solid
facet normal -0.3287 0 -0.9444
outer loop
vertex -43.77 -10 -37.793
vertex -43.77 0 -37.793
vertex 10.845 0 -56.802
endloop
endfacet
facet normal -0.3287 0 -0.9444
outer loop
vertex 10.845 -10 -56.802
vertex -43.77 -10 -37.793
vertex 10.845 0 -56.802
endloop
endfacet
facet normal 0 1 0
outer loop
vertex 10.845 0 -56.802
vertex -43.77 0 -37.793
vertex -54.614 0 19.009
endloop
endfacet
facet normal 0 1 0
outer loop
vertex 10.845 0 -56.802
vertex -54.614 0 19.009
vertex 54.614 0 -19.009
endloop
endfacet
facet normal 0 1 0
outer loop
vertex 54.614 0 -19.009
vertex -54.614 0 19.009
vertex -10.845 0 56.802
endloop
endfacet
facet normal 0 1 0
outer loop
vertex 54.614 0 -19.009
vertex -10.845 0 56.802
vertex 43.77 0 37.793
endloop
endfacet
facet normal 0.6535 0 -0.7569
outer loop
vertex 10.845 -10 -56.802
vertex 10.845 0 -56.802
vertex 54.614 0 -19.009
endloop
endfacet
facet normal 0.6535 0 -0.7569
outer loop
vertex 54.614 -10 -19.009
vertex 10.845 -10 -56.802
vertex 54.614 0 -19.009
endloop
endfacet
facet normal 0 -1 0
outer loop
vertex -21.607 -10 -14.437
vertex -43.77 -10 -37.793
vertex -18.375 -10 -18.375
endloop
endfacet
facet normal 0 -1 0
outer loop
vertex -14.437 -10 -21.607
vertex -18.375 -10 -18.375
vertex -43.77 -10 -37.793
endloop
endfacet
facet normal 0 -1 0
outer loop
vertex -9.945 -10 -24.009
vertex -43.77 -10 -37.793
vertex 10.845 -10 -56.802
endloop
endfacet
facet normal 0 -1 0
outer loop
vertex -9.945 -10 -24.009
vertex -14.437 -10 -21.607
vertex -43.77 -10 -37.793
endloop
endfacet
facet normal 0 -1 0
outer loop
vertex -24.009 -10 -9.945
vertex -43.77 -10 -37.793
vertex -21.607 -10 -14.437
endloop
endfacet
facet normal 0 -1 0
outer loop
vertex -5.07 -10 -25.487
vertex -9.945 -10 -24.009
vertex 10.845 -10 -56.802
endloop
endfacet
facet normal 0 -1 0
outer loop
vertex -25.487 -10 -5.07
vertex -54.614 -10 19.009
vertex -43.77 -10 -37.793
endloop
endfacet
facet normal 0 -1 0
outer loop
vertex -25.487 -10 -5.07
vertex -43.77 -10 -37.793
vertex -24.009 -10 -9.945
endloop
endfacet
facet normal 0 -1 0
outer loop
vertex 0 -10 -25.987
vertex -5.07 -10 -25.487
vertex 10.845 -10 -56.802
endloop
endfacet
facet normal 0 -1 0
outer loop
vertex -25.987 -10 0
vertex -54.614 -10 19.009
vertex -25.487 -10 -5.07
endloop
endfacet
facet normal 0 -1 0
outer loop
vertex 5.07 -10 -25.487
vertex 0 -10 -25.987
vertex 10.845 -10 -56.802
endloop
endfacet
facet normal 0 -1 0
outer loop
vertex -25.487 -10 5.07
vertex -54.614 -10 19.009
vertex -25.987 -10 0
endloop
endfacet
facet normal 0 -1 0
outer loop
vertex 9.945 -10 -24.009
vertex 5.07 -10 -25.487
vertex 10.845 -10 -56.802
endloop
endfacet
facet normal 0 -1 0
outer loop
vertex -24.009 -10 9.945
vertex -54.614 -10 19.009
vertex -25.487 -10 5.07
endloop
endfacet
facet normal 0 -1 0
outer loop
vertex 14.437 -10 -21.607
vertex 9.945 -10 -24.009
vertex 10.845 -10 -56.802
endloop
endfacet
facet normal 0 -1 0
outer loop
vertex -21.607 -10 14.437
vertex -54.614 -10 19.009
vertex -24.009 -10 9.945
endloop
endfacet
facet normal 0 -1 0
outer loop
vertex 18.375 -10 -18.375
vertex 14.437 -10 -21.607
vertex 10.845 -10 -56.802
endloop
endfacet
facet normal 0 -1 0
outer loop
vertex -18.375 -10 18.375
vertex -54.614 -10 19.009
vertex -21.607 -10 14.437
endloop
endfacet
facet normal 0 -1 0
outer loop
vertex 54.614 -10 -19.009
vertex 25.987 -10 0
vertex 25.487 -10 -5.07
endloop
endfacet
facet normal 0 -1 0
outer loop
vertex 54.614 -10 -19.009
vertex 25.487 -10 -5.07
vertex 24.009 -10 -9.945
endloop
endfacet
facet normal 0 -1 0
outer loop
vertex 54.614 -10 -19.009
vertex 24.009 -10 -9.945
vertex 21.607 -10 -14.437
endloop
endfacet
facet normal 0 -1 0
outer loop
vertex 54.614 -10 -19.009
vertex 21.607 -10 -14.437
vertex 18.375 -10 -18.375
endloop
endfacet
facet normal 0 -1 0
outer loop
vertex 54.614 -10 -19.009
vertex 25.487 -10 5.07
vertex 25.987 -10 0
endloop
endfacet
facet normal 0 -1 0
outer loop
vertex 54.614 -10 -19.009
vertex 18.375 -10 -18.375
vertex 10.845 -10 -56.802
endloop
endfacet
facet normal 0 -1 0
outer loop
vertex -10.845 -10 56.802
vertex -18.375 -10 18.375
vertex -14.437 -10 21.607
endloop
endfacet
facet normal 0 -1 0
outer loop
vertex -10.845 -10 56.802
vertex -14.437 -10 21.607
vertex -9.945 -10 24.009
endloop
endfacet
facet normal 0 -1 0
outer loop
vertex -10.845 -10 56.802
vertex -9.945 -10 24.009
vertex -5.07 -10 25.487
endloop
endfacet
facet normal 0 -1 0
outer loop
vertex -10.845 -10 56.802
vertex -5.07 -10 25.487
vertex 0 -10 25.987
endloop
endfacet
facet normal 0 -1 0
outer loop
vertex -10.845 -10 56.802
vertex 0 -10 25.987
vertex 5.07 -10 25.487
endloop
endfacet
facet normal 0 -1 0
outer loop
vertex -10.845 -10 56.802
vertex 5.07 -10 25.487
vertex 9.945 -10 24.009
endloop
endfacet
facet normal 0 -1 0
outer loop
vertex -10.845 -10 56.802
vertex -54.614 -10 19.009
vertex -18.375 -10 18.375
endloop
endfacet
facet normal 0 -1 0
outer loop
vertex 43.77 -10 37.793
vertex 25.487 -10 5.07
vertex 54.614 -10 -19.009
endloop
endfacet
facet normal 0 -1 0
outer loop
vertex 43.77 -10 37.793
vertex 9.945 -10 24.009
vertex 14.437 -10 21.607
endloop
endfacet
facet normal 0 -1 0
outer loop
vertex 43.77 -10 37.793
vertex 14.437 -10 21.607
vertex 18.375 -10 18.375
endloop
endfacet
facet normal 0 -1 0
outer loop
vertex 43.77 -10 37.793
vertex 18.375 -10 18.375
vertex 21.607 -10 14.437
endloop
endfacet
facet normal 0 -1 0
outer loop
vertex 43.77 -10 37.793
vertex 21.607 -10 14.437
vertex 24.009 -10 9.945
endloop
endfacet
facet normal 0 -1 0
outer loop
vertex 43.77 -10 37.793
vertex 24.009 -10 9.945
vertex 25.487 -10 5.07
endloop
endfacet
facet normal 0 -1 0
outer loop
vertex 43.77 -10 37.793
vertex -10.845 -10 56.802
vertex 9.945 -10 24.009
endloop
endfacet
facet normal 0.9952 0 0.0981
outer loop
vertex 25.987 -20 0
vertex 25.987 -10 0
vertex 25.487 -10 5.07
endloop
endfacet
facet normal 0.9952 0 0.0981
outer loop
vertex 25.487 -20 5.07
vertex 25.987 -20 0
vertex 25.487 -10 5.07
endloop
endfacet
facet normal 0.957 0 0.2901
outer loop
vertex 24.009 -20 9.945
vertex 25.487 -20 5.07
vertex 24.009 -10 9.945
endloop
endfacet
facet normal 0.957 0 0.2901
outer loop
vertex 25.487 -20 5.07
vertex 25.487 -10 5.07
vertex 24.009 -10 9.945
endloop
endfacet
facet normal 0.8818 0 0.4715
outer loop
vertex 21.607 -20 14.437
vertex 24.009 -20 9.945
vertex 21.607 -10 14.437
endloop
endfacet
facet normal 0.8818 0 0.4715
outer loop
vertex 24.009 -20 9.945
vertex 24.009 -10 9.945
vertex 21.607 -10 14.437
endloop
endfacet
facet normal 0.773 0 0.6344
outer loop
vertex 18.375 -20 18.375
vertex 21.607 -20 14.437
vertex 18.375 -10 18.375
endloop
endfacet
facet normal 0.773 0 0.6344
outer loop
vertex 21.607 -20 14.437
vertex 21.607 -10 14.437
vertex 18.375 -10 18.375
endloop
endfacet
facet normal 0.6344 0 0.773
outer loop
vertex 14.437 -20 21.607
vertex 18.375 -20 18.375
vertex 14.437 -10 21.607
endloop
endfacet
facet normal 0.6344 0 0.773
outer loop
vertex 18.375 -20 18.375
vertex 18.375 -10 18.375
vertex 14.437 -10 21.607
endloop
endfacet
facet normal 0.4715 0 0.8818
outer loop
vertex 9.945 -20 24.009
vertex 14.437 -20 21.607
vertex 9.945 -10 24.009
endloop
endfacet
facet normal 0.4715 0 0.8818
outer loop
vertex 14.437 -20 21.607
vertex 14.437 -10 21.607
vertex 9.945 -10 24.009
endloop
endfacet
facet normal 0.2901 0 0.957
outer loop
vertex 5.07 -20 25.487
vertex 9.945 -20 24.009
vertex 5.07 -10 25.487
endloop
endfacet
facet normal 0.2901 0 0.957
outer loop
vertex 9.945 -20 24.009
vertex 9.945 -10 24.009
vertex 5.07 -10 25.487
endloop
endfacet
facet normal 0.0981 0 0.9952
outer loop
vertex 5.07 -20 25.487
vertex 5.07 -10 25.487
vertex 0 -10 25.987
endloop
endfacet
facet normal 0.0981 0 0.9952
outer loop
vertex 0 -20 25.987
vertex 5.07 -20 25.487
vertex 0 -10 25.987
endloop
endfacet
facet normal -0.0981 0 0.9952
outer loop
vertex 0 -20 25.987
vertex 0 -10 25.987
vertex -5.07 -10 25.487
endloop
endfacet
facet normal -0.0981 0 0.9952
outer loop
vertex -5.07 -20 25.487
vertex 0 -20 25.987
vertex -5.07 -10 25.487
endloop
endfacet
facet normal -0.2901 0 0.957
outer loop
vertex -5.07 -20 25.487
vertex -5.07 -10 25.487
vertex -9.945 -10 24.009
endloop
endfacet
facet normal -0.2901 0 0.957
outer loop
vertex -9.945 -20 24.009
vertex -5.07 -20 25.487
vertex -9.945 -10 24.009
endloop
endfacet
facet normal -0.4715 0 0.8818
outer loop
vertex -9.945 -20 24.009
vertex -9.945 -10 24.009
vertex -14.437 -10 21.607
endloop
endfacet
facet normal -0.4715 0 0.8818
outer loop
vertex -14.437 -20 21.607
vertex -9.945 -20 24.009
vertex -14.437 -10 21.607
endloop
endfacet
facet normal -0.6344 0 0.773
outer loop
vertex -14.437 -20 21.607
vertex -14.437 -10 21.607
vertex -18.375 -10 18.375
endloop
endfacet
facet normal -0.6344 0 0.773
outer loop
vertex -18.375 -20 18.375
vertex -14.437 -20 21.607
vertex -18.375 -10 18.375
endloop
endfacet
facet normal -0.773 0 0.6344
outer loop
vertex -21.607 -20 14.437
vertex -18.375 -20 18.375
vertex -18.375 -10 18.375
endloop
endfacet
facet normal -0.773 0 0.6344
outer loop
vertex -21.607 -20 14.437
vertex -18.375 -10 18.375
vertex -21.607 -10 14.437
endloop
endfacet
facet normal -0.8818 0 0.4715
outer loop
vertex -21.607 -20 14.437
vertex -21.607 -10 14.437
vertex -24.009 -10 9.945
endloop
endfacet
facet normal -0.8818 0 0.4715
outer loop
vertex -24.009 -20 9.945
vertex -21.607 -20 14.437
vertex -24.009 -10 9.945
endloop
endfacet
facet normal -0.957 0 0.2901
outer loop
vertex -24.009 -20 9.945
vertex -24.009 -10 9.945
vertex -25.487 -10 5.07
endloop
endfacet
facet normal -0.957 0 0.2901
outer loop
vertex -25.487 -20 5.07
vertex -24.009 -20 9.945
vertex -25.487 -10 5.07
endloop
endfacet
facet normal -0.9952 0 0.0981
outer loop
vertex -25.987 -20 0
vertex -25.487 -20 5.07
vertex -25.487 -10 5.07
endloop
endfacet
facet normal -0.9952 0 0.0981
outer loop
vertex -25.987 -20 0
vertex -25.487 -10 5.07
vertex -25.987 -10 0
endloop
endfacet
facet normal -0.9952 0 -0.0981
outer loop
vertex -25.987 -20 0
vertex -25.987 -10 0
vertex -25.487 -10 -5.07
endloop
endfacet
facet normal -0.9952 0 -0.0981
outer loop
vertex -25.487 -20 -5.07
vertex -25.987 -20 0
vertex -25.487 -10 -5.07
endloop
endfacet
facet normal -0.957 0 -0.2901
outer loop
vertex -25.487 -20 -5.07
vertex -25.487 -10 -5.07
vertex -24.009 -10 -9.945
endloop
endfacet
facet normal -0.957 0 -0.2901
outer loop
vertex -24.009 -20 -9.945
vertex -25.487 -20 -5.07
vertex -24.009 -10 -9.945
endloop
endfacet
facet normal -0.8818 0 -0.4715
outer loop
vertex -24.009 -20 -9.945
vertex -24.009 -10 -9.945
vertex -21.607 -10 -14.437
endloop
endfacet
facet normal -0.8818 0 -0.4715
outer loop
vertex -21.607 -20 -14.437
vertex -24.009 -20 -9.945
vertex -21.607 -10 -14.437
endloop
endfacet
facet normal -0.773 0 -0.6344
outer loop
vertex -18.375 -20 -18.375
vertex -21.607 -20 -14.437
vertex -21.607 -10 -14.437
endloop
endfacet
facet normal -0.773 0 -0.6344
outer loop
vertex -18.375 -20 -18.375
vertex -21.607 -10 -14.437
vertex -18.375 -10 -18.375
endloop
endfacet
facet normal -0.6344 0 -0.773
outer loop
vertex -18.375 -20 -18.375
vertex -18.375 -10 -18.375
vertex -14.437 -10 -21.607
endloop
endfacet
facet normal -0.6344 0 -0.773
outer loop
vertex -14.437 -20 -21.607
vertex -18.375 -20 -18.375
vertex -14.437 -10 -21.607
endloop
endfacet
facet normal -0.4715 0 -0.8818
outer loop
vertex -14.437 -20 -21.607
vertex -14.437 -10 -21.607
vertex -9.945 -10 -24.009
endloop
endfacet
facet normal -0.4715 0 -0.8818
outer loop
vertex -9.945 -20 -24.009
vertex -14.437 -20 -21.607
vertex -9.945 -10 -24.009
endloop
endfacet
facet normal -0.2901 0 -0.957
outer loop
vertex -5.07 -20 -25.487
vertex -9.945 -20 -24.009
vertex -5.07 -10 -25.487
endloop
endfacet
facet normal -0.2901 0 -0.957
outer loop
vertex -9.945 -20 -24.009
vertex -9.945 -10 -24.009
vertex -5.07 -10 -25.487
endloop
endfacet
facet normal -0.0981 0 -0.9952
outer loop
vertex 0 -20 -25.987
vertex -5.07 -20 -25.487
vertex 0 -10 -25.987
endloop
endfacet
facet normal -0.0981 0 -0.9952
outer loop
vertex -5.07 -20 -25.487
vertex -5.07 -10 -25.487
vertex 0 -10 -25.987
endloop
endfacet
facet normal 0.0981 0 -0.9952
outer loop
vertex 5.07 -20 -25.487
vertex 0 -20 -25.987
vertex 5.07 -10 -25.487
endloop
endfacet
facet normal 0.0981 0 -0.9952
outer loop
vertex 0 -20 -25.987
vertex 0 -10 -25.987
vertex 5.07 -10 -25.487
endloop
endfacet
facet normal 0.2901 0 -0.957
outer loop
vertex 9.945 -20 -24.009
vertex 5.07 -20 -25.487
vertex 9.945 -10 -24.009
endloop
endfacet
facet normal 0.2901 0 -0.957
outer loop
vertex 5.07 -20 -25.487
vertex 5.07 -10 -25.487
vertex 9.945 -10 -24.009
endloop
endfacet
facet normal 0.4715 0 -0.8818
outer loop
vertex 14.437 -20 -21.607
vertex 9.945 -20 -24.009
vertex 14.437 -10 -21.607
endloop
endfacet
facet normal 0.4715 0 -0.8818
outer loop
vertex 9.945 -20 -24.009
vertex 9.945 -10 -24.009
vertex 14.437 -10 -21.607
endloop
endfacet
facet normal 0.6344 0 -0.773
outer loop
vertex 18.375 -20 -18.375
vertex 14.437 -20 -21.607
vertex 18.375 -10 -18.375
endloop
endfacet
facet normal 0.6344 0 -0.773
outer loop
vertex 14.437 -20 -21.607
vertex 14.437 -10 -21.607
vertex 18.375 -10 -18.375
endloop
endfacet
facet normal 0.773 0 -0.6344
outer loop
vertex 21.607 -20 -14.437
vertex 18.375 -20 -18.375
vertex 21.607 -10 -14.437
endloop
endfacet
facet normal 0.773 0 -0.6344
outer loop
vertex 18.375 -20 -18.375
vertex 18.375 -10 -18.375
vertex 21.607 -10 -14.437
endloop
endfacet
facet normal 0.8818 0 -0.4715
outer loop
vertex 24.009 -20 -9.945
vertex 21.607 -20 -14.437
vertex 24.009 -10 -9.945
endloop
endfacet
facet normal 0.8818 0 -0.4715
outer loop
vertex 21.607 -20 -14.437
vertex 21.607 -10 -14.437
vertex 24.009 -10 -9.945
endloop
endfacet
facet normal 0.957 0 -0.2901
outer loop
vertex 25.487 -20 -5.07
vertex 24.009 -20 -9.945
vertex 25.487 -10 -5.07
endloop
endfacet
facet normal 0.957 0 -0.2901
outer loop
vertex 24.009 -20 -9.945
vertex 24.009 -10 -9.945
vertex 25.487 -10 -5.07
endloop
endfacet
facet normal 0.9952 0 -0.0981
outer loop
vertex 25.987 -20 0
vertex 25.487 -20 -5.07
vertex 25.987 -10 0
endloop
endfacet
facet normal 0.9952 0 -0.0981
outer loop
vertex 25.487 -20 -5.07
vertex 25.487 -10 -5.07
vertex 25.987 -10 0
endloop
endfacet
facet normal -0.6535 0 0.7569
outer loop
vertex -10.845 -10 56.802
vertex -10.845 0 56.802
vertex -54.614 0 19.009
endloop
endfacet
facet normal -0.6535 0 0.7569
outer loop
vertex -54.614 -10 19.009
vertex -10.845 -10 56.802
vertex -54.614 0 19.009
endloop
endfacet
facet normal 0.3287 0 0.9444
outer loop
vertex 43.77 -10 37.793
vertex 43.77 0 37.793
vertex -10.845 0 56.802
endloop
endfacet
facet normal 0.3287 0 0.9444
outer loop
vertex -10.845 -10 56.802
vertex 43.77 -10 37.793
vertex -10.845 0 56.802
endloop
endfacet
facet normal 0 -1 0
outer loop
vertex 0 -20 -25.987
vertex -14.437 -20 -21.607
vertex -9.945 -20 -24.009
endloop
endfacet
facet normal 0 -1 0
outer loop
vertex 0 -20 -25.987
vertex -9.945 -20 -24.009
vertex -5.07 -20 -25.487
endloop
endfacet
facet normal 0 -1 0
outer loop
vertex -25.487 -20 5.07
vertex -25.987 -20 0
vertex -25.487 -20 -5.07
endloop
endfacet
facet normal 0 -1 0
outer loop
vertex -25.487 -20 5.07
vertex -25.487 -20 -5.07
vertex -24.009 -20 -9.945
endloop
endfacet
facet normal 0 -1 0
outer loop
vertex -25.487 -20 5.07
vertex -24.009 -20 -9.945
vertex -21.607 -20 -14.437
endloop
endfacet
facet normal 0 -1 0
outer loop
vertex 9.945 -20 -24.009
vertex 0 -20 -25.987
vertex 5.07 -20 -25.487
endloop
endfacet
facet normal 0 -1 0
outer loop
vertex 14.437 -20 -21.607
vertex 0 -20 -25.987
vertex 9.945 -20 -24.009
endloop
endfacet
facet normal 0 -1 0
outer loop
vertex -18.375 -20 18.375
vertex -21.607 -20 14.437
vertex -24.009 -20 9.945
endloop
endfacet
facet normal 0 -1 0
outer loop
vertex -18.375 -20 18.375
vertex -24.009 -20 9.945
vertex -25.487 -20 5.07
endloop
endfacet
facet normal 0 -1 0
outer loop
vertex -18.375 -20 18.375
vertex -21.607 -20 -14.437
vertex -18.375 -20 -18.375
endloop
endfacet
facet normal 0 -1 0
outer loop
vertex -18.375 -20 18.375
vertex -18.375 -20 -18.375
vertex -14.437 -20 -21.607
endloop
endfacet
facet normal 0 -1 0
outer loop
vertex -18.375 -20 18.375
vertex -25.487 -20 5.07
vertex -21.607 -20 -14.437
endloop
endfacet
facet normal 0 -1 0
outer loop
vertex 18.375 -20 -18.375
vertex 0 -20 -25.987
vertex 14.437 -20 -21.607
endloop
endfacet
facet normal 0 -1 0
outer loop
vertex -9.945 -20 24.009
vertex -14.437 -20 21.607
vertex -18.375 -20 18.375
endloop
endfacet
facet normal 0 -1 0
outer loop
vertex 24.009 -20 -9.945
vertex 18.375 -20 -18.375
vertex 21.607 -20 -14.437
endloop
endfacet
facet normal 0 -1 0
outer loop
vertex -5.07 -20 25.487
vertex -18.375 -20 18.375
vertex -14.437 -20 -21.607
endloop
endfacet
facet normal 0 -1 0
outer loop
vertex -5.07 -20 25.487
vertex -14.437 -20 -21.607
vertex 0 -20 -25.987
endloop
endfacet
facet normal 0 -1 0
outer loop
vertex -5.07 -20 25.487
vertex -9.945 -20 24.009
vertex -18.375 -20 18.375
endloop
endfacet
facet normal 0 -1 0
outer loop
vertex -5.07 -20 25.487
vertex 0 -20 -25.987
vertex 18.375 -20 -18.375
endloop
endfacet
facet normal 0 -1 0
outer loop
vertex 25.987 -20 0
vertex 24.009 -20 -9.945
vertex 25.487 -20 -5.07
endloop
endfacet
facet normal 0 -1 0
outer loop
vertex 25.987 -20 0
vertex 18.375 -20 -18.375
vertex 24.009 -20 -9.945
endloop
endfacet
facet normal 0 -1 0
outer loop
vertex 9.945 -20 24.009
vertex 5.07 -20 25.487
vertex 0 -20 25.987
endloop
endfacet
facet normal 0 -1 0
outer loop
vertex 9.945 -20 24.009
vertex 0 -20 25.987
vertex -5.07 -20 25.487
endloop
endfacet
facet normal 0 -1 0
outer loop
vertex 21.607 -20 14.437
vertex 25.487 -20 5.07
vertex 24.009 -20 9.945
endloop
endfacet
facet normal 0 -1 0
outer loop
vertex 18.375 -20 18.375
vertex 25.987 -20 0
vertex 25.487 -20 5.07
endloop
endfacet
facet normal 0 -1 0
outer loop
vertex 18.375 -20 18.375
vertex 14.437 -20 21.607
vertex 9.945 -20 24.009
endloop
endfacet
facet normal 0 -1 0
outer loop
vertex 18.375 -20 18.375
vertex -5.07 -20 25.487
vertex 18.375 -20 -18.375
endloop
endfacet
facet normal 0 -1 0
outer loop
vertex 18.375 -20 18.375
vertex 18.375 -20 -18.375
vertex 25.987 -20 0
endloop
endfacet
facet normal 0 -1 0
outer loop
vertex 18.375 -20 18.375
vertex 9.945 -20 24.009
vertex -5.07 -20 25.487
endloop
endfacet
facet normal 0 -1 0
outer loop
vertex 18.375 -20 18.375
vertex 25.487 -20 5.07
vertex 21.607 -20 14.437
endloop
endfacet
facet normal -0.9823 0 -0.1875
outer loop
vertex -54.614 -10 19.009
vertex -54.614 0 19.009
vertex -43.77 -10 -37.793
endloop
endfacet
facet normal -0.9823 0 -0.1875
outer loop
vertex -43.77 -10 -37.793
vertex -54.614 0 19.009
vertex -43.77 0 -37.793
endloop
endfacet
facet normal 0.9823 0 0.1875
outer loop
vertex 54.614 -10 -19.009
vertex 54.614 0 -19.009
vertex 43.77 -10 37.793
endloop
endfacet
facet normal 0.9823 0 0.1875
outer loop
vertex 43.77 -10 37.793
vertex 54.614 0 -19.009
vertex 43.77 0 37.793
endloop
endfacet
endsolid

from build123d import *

# Parameters (mm, degrees)
F1_DEPTH = 10
F2_R     = 25.98667
F3_DEPTH = 20


with BuildPart() as f1:
    # F0 (on Front) → F1 (new body)
    with BuildSketch(Plane.XZ):
        Polygon((10.844505, -56.802116), (54.614328, -19.009441), (43.769823, 37.792675), (-10.844505, 56.802116), (-54.614328, 19.009441), (-43.769823, -37.792675), align=None)
    extrude(amount=F1_DEPTH)

    # F2 (on Front) → F3 (join)
    with BuildSketch(Plane.XZ):
        Circle(F2_R)
    extrude(amount=F3_DEPTH)


solid = f1.part
